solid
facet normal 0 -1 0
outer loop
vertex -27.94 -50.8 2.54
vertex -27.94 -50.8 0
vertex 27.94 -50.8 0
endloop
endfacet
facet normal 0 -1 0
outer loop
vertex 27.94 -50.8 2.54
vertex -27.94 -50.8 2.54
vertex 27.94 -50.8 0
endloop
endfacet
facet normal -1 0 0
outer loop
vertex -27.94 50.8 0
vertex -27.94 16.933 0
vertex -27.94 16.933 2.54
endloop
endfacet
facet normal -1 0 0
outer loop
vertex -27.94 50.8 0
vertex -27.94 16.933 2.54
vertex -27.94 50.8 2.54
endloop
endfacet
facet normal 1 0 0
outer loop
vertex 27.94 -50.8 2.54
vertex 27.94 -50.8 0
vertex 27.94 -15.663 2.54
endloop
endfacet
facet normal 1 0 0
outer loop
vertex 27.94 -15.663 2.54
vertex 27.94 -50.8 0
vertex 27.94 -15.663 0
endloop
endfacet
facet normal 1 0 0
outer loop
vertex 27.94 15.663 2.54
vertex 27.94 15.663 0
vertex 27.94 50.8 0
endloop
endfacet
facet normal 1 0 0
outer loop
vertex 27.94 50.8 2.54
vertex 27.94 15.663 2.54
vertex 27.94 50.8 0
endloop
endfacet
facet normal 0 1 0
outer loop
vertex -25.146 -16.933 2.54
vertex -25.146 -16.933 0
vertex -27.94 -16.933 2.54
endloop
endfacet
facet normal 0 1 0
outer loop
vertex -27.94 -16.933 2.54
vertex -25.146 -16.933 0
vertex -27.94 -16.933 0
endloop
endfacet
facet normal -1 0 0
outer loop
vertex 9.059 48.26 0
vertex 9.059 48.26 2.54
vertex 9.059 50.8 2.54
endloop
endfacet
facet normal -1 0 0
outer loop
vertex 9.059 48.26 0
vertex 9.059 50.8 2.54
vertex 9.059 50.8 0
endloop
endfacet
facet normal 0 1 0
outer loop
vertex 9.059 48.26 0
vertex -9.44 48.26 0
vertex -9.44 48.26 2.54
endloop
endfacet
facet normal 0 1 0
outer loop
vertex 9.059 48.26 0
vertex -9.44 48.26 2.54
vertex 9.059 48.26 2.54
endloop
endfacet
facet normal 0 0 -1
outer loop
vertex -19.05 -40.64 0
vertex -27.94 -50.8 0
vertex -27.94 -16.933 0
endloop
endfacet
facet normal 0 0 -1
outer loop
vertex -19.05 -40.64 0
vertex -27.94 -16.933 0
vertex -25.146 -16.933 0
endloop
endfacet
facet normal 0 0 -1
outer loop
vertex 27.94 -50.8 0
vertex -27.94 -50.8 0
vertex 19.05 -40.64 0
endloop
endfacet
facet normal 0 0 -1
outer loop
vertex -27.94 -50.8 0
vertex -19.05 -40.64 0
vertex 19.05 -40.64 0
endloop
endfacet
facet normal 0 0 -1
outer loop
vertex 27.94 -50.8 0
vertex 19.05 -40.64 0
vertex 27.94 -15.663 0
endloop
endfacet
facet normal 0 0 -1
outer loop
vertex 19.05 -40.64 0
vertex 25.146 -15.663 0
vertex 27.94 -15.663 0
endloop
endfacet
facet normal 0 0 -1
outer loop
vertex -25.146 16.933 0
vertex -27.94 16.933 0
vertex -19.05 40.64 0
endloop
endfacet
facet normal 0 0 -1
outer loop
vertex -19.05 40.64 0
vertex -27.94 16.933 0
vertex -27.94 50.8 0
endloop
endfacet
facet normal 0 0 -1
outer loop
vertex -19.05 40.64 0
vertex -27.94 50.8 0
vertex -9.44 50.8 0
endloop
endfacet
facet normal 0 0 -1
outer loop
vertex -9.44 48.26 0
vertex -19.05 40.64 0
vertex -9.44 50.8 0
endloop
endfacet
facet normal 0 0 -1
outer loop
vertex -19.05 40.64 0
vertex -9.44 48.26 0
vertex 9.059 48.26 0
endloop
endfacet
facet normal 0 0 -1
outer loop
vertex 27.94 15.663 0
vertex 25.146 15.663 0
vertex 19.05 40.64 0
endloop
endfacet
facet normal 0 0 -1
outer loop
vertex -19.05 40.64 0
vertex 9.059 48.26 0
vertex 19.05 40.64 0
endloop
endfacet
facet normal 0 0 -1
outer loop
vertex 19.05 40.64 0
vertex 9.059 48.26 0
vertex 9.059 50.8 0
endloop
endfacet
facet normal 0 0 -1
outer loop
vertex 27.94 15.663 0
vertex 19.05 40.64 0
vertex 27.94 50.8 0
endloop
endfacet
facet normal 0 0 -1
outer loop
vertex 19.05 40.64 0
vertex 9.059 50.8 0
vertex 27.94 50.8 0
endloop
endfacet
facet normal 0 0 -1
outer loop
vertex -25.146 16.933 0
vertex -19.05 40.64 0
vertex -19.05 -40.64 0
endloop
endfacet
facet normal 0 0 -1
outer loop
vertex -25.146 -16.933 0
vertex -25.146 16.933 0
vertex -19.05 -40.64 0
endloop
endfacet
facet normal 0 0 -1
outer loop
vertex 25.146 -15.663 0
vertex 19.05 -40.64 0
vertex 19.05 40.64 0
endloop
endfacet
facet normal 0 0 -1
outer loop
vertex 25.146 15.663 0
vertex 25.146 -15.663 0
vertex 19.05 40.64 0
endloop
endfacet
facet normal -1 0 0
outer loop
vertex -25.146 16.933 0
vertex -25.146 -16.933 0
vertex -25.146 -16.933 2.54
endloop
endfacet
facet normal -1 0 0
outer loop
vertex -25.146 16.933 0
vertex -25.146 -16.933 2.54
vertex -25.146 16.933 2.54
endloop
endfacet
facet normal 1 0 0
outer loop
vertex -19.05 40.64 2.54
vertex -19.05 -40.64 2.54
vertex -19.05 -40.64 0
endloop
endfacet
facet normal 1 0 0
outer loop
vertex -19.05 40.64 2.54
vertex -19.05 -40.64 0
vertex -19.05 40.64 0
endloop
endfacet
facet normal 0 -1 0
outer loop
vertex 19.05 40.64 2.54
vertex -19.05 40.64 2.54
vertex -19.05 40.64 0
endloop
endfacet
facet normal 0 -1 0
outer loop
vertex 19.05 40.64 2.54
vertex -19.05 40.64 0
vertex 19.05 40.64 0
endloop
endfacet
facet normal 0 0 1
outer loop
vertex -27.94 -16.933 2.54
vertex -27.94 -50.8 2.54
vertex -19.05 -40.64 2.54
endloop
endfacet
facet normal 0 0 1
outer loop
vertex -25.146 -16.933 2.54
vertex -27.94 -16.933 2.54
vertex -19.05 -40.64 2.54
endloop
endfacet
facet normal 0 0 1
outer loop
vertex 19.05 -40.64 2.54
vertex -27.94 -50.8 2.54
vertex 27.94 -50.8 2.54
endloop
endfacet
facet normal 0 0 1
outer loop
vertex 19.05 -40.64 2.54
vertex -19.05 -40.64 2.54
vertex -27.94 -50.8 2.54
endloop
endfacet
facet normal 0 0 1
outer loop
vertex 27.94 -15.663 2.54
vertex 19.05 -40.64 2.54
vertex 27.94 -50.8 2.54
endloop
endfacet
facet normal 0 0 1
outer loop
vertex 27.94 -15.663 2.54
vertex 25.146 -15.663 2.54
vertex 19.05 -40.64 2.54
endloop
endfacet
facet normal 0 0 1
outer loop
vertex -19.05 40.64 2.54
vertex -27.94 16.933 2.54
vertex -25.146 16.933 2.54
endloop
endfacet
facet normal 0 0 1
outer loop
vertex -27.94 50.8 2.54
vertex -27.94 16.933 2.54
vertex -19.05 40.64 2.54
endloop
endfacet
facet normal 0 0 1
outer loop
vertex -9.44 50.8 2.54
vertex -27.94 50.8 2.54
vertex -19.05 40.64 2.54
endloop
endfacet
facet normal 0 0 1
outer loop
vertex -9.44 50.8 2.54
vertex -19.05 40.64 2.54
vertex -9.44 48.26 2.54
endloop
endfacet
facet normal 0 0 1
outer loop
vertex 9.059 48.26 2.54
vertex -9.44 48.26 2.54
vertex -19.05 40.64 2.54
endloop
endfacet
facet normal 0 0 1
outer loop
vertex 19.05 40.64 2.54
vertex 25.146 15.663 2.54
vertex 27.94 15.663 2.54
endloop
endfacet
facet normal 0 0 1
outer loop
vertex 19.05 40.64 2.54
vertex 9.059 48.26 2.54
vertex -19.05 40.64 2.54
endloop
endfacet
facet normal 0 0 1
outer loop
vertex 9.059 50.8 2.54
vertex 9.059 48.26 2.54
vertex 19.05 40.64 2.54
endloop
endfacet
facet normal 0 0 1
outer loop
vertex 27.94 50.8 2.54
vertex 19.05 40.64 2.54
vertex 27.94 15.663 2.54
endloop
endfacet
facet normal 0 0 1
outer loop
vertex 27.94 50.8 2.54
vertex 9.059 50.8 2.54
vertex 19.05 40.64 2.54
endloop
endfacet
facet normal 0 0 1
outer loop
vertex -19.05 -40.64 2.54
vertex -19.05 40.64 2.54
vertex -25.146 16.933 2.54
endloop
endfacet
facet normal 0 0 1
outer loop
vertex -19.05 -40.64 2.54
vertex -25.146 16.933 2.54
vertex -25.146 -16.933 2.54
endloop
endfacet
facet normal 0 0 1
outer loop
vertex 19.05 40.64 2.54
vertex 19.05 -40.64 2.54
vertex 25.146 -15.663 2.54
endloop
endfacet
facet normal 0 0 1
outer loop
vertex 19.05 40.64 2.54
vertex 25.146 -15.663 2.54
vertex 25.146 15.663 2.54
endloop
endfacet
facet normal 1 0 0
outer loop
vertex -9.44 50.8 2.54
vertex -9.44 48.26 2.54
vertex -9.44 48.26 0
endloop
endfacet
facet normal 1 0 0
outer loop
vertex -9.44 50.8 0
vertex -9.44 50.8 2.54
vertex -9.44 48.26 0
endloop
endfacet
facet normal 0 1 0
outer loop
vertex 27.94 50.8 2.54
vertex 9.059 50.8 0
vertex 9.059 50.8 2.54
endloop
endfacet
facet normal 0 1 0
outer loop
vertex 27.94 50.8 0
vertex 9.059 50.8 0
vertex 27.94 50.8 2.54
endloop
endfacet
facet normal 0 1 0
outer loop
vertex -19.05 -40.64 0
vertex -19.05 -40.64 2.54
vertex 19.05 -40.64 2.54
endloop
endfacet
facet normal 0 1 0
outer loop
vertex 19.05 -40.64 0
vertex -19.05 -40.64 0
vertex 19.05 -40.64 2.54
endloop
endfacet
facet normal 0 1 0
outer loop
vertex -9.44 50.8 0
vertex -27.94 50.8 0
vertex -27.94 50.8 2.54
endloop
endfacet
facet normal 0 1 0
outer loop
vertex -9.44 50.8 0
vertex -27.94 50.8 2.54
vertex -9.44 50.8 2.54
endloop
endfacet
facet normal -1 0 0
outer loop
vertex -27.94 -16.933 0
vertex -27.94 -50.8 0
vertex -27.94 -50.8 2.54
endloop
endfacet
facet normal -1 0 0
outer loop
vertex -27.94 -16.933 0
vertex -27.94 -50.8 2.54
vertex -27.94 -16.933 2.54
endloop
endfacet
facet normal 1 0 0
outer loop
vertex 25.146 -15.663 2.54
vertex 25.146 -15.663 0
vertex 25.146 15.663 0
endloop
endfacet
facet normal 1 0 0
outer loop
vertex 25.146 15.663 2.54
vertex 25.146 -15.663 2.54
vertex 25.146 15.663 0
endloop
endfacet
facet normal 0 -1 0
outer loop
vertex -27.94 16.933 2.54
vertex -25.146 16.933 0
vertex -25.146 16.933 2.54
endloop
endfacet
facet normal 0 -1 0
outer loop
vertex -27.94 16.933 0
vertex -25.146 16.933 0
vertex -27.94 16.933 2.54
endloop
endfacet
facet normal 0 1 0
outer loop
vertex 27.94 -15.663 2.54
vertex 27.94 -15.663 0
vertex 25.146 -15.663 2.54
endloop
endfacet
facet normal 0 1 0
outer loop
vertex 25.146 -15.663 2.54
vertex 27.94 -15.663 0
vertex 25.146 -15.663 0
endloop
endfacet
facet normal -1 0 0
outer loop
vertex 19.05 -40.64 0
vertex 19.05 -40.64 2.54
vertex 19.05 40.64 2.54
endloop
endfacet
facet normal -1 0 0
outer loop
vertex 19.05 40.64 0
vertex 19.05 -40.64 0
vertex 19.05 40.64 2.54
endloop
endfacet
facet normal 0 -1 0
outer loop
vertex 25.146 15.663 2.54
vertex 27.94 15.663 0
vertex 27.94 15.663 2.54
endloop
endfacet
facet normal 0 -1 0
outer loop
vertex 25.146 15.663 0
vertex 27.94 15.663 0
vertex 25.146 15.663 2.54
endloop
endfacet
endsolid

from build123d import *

# Parameters (mm, degrees)
SKETCH1_W           = 55.88
SKETCH1_H           = 101.6
BOSS_EXTRUDE1_DEPTH = 2.54
SKETCH2_W           = 2.794
SKETCH2_H           = 31.326666666
SKETCH2_H_2         = 33.866666666
CUT_EXTRUDE1_DEPTH  = 59.032191067
SKETCH3_W           = 38.1
SKETCH3_H           = 81.28
CUT_EXTRUDE2_DEPTH  = 59.032191067
CAVITY1_START       = 48.26
CAVITY1_OUTLINE_W   = 18.499605322
CAVITY1_OUTLINE_H   = 2.54
CAVITY1_DEPTH       = 2.54


# Read off the part's stored shape, not the designer's step: Cavity1
with BuildPart() as part:
    # Sketch1 → Boss-Extrude1 (new body)
    with BuildSketch(Plane.XY):
        Rectangle(SKETCH1_W, SKETCH1_H)
    extrude(amount=BOSS_EXTRUDE1_DEPTH)

    # Sketch2 → Cut-Extrude1 (cut, through all)
    with BuildSketch(Plane(origin=(0, 0, 0), x_dir=(-1, 0, 0), z_dir=(0, 0, -1))):
        with Locations((-26.543, 0)):
            Rectangle(SKETCH2_W, SKETCH2_H)
        with Locations((26.543, 0)):
            Rectangle(SKETCH2_W, SKETCH2_H_2)
    extrude(amount=-CUT_EXTRUDE1_DEPTH, mode=Mode.SUBTRACT)

    # Sketch3 → Cut-Extrude2 (cut, through all)
    with BuildSketch(Plane.XY.offset(2.54)):
        Rectangle(SKETCH3_W, SKETCH3_H)
    extrude(amount=-CUT_EXTRUDE2_DEPTH, mode=Mode.SUBTRACT)

    # Cavity1 outline → Cavity1 (cut)
    with BuildSketch(Plane(origin=(0, 0, 0), x_dir=(1, 0, 0), z_dir=(0, 1, 0)).offset(CAVITY1_START)):
        with Locations((-0.190592016, -1.27)):
            Rectangle(CAVITY1_OUTLINE_W, CAVITY1_OUTLINE_H)
    extrude(amount=CAVITY1_DEPTH, mode=Mode.SUBTRACT)


solid = part.part
